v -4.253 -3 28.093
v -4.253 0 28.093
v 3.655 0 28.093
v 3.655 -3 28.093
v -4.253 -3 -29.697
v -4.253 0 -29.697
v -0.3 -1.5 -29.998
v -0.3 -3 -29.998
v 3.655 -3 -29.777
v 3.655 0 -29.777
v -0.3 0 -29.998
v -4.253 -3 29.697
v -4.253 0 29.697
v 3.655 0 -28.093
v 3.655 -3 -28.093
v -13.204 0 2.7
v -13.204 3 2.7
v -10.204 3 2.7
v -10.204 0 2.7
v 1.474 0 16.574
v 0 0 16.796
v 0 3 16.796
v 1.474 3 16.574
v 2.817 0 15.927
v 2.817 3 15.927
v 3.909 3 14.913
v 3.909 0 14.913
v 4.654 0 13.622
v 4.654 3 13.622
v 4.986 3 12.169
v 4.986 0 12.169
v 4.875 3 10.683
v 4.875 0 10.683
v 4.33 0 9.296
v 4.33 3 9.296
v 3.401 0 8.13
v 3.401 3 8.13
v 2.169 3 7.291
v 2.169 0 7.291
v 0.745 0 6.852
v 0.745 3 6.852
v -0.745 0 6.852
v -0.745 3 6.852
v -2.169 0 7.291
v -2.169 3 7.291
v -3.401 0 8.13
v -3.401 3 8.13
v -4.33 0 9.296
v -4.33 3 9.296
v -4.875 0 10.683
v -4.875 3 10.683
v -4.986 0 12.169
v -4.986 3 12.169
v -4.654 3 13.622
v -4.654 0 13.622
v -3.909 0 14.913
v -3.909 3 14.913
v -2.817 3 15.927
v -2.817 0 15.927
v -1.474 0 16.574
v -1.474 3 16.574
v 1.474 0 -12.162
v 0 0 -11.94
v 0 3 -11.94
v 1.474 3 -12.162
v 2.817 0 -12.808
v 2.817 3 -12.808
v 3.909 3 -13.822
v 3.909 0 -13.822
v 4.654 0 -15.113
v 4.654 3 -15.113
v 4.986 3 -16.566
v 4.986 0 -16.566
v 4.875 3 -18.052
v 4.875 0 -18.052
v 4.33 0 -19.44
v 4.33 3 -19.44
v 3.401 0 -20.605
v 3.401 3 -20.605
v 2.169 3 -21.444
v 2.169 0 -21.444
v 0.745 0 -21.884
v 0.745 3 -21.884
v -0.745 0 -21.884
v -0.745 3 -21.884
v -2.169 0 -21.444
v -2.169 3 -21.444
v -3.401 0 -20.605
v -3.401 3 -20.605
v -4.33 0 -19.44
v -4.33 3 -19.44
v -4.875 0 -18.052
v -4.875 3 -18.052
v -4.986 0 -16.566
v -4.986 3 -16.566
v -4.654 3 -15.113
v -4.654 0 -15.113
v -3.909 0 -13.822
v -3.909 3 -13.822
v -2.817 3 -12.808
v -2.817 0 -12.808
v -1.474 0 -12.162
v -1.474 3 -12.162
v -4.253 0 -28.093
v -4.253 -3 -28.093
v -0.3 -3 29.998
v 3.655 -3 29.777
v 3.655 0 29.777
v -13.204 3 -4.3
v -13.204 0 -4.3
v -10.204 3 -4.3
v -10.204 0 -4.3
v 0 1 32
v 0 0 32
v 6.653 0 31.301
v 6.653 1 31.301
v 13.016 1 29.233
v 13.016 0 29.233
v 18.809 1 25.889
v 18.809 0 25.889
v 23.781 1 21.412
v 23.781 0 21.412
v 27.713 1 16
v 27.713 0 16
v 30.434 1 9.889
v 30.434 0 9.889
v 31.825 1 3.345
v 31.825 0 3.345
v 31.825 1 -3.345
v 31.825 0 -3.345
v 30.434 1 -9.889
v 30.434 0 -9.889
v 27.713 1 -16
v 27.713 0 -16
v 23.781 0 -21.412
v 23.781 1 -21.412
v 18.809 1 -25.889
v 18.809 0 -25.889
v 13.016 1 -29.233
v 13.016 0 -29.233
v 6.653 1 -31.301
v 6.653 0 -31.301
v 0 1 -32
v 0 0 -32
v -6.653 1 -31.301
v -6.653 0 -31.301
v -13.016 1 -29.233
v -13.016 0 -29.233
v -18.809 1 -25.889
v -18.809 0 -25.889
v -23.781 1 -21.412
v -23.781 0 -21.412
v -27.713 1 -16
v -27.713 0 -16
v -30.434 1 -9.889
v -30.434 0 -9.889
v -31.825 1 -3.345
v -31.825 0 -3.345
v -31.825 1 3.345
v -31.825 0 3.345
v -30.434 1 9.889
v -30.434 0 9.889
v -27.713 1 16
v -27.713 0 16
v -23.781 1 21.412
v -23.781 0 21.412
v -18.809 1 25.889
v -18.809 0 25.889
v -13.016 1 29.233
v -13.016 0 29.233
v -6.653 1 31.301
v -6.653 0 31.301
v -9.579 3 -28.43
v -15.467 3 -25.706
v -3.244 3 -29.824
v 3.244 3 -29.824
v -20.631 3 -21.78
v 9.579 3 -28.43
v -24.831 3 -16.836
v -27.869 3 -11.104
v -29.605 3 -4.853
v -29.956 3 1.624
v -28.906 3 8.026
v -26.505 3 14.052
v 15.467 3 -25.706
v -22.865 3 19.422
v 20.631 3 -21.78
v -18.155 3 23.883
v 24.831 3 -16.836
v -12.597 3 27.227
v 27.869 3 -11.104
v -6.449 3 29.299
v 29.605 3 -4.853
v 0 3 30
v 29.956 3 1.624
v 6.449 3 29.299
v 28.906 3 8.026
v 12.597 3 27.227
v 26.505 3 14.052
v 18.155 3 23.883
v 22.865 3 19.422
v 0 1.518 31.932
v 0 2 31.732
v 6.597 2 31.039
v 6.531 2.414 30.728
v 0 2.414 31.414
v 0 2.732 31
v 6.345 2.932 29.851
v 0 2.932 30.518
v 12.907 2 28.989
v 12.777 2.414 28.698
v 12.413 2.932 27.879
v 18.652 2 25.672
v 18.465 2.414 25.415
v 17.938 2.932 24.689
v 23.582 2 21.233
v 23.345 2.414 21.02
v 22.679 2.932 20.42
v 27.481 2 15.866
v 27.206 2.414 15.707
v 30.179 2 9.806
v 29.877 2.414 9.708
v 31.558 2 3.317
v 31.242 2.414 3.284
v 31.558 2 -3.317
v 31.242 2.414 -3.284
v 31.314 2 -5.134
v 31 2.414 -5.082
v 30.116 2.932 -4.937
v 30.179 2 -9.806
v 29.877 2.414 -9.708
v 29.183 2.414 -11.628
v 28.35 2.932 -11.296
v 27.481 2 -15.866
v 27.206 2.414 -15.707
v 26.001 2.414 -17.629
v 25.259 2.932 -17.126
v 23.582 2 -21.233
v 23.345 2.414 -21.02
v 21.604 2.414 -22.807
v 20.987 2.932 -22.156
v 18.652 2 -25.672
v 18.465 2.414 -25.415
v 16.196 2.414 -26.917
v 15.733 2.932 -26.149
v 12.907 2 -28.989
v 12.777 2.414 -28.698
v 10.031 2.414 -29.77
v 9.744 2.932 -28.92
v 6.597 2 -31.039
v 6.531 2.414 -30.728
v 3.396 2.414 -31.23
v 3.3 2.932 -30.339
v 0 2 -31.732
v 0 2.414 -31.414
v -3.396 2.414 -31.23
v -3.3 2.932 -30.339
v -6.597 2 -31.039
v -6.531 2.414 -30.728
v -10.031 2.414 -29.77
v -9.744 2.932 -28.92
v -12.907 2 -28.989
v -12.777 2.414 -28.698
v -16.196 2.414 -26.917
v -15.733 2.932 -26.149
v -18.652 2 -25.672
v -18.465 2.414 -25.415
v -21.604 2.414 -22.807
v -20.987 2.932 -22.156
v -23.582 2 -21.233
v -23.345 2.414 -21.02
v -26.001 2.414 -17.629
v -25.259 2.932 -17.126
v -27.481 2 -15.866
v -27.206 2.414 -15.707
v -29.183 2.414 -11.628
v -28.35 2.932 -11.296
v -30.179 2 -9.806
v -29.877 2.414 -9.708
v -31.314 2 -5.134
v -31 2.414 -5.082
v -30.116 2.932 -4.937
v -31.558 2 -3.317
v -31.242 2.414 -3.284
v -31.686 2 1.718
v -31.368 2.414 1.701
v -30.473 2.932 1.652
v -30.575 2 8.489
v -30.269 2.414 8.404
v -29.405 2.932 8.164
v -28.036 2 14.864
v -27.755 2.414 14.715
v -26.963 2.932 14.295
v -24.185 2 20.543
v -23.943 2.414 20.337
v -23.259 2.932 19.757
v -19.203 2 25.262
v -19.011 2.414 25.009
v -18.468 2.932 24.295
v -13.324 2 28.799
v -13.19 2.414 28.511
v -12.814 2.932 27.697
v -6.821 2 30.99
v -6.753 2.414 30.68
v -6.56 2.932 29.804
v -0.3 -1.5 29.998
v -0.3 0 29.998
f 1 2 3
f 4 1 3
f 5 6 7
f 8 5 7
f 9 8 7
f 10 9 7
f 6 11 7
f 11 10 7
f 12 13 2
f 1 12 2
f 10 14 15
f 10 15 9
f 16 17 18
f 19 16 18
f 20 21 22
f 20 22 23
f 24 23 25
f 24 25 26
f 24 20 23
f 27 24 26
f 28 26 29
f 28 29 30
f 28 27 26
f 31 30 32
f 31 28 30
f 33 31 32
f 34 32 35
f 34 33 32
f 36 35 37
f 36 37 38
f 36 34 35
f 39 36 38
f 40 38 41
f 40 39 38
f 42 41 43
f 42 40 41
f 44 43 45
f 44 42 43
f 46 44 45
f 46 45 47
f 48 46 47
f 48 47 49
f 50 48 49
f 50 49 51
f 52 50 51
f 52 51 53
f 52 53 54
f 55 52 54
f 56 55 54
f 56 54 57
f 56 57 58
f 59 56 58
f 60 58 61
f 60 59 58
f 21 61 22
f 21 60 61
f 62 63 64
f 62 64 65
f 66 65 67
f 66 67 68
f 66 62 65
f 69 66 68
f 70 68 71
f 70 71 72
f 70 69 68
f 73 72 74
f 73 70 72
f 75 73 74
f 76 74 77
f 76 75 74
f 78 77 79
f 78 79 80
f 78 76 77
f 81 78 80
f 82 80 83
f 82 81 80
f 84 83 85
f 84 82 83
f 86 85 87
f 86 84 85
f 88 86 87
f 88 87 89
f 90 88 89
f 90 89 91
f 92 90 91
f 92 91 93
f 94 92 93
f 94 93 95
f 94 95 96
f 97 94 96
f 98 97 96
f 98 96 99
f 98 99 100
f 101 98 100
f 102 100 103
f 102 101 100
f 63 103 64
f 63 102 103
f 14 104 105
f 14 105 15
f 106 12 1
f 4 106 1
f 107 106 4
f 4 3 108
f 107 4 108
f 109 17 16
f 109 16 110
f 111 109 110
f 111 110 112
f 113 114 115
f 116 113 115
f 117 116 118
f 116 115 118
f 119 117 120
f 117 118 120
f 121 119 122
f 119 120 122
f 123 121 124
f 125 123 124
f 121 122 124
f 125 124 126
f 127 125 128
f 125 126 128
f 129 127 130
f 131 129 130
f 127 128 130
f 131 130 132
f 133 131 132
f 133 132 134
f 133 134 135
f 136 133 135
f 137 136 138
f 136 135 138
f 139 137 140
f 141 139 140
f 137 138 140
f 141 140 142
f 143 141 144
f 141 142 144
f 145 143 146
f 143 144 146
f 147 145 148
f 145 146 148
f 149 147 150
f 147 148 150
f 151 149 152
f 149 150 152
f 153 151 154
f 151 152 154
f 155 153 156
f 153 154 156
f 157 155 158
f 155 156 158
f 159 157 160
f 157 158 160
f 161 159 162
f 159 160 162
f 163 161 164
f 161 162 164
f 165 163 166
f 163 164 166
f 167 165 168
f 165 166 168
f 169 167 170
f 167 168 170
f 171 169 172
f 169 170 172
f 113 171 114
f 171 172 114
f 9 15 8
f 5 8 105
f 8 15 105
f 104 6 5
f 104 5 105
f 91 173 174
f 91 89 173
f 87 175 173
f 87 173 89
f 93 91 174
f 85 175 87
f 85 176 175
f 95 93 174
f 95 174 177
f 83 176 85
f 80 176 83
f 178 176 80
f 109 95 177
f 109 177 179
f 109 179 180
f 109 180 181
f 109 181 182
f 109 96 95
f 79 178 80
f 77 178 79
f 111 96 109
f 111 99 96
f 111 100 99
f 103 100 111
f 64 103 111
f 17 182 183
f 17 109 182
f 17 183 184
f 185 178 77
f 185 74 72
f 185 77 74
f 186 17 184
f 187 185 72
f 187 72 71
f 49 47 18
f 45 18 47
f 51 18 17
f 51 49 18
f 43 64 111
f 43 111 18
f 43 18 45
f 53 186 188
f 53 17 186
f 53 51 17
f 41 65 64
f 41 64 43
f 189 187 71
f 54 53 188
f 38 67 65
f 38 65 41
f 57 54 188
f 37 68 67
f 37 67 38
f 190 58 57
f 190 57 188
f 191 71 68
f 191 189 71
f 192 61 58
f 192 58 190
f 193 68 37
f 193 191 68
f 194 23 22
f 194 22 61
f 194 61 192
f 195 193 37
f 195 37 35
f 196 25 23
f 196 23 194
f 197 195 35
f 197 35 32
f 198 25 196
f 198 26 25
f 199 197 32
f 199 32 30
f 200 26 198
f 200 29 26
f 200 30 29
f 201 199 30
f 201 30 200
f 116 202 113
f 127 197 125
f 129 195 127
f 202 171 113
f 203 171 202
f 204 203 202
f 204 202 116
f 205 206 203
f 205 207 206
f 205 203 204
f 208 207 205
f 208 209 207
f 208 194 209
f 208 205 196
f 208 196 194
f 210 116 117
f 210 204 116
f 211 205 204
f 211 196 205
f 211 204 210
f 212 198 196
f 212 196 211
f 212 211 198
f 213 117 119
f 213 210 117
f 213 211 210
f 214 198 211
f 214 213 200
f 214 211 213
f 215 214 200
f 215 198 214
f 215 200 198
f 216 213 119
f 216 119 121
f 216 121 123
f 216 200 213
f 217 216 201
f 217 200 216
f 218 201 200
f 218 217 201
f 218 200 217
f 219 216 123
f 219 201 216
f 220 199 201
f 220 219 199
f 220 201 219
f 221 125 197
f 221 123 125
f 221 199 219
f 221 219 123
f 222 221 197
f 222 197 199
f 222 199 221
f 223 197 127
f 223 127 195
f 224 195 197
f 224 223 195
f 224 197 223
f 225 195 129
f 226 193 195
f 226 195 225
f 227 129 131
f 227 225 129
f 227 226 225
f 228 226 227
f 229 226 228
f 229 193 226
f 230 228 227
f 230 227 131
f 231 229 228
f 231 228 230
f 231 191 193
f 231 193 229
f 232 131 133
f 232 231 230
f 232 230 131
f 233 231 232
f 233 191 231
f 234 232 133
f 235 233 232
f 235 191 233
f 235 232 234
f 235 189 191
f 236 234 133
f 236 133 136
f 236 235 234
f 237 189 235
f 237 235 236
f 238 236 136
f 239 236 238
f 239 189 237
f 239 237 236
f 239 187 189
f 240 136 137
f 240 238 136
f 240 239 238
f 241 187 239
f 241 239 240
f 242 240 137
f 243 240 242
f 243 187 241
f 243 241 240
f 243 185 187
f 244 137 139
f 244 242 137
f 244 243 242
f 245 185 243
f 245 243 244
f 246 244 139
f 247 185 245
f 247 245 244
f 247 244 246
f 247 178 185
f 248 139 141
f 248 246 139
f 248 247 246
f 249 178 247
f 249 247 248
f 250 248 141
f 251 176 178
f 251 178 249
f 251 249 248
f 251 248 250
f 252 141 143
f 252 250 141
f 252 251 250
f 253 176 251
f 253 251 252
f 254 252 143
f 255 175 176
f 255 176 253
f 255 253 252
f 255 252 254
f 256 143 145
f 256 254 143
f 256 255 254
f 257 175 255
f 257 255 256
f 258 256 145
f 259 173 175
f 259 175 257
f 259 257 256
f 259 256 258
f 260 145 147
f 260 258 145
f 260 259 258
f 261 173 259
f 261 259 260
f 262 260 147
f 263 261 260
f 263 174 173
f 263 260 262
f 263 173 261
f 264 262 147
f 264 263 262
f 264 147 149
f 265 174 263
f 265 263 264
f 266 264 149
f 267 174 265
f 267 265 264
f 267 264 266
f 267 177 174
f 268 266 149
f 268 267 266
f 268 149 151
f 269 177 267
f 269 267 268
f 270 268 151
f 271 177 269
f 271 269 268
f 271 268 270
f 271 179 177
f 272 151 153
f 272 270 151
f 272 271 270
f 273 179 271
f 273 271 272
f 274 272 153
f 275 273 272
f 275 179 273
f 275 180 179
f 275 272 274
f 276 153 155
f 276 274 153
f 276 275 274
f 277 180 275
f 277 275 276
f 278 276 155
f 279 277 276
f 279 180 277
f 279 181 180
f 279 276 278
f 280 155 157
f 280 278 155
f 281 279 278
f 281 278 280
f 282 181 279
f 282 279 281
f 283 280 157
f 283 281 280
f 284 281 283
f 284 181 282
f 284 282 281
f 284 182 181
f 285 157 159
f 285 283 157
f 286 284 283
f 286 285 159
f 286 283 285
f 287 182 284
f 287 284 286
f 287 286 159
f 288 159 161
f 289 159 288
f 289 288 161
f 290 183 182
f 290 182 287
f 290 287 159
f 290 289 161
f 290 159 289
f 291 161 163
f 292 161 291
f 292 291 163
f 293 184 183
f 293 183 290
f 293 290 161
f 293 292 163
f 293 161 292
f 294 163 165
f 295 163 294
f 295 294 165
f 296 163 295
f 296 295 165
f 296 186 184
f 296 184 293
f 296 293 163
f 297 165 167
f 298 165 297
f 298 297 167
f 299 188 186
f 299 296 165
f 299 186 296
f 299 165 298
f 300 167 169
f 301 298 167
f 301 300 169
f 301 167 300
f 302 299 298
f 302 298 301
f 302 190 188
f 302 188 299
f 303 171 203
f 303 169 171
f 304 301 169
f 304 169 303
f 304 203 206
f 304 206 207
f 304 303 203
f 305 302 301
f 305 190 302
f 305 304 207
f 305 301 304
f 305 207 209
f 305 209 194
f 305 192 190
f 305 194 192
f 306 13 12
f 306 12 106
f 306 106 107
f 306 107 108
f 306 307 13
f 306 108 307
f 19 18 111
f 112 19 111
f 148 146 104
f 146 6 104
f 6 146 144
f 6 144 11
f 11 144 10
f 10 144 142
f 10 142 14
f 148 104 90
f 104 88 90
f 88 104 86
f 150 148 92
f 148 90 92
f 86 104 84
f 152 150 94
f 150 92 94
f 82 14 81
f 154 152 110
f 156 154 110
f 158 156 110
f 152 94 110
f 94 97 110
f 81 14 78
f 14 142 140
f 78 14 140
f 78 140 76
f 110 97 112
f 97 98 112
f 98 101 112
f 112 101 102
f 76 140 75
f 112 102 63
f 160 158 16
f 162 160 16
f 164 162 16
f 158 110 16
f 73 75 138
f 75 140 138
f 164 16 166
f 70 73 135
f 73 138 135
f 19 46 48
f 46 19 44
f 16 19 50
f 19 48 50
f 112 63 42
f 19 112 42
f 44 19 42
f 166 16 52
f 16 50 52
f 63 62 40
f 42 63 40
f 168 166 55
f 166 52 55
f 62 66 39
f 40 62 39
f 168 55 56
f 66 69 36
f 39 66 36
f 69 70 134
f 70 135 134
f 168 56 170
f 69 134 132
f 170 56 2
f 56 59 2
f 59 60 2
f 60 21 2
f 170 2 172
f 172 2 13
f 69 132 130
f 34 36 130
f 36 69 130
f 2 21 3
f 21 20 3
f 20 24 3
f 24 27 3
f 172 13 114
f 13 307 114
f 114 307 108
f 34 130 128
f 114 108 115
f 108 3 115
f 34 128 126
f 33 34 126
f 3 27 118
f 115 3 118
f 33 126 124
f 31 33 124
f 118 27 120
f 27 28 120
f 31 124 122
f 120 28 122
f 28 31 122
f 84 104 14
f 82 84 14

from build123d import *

# Parameters (mm, degrees)
ESQUISSE2_R             = 32
ESQUISSE2_R_2           = 5
BOSS_EXTRU_1_DEPTH      = 3
CONG_1_R                = 2
BOSS_EXTRU_2_DEPTH      = 3
ESQUISSE4_W             = 3
ESQUISSE4_H             = 7
ENL_V_MAT_EXTRU_1_DEPTH = 10


with BuildPart() as part:
    # Esquisse2 → Boss.-Extru.1 (new body)
    with BuildSketch(Plane(origin=(0, 0, 0), x_dir=(1, 0, 0), z_dir=(0, 1, 0))):
        with Locations(Location((0, 0, 0), (0, 0, 270))):
            Circle(ESQUISSE2_R)
        with Locations(Location((0, -11.795669906, 0), (0, 0, 270))):
            Circle(ESQUISSE2_R_2, mode=Mode.SUBTRACT)
        with Locations(Location((0, 16.939646256, 0), (0, 0, 270))):
            Circle(ESQUISSE2_R_2, mode=Mode.SUBTRACT)
    extrude(amount=BOSS_EXTRU_1_DEPTH)

    # Congé1
    cong_1_edges = [part.edges().sort_by_distance(p)[0] for p in [
        (0, 3, -32),
    ]]
    fillet(cong_1_edges, radius=CONG_1_R)

    # Esquisse3 → Boss.-Extru.2 (add)
    with BuildSketch(Plane.XZ):
        with BuildLine():
            Line((-4.252814477, 29.697029633), (-4.252814477, 28.09287077))
            Line((-4.252814477, 28.09287077), (3.65484317, 28.09287077))
            Line((3.65484317, 28.09287077), (3.65484317, 29.776536424))
            add(Edge.make_bspline(
                [(-4.252814477, 29.697029633), (-0.301616898, 30.260197697), (3.65484317, 29.776536424)],
                knots=[0, 0, 0, 1, 1, 1], degree=2))
        make_face()
        with BuildLine():
            Line((-4.252814477, -28.09287077), (3.65484317, -28.09287077))
            Line((3.65484317, -28.09287077), (3.65484317, -29.776536424))
            add(Edge.make_bspline(
                [(-4.252814477, -29.697029633), (-0.301616898, -30.260197697), (3.65484317, -29.776536424)],
                knots=[0, 0, 0, 1, 1, 1], degree=2))
            Line((-4.252814477, -29.697029633), (-4.252814477, -28.09287077))
        make_face()
    extrude(amount=BOSS_EXTRU_2_DEPTH)

    # Esquisse4 → Enlèv. mat.-Extru.1 (cut)
    with BuildSketch(Plane(origin=(0, 3, 0), x_dir=(1, 0, 0), z_dir=(0, 1, 0))):
        with Locations((-11.703666828, 0.799999388)):
            Rectangle(ESQUISSE4_W, ESQUISSE4_H)
    extrude(amount=-ENL_V_MAT_EXTRU_1_DEPTH, mode=Mode.SUBTRACT)


solid = part.part
